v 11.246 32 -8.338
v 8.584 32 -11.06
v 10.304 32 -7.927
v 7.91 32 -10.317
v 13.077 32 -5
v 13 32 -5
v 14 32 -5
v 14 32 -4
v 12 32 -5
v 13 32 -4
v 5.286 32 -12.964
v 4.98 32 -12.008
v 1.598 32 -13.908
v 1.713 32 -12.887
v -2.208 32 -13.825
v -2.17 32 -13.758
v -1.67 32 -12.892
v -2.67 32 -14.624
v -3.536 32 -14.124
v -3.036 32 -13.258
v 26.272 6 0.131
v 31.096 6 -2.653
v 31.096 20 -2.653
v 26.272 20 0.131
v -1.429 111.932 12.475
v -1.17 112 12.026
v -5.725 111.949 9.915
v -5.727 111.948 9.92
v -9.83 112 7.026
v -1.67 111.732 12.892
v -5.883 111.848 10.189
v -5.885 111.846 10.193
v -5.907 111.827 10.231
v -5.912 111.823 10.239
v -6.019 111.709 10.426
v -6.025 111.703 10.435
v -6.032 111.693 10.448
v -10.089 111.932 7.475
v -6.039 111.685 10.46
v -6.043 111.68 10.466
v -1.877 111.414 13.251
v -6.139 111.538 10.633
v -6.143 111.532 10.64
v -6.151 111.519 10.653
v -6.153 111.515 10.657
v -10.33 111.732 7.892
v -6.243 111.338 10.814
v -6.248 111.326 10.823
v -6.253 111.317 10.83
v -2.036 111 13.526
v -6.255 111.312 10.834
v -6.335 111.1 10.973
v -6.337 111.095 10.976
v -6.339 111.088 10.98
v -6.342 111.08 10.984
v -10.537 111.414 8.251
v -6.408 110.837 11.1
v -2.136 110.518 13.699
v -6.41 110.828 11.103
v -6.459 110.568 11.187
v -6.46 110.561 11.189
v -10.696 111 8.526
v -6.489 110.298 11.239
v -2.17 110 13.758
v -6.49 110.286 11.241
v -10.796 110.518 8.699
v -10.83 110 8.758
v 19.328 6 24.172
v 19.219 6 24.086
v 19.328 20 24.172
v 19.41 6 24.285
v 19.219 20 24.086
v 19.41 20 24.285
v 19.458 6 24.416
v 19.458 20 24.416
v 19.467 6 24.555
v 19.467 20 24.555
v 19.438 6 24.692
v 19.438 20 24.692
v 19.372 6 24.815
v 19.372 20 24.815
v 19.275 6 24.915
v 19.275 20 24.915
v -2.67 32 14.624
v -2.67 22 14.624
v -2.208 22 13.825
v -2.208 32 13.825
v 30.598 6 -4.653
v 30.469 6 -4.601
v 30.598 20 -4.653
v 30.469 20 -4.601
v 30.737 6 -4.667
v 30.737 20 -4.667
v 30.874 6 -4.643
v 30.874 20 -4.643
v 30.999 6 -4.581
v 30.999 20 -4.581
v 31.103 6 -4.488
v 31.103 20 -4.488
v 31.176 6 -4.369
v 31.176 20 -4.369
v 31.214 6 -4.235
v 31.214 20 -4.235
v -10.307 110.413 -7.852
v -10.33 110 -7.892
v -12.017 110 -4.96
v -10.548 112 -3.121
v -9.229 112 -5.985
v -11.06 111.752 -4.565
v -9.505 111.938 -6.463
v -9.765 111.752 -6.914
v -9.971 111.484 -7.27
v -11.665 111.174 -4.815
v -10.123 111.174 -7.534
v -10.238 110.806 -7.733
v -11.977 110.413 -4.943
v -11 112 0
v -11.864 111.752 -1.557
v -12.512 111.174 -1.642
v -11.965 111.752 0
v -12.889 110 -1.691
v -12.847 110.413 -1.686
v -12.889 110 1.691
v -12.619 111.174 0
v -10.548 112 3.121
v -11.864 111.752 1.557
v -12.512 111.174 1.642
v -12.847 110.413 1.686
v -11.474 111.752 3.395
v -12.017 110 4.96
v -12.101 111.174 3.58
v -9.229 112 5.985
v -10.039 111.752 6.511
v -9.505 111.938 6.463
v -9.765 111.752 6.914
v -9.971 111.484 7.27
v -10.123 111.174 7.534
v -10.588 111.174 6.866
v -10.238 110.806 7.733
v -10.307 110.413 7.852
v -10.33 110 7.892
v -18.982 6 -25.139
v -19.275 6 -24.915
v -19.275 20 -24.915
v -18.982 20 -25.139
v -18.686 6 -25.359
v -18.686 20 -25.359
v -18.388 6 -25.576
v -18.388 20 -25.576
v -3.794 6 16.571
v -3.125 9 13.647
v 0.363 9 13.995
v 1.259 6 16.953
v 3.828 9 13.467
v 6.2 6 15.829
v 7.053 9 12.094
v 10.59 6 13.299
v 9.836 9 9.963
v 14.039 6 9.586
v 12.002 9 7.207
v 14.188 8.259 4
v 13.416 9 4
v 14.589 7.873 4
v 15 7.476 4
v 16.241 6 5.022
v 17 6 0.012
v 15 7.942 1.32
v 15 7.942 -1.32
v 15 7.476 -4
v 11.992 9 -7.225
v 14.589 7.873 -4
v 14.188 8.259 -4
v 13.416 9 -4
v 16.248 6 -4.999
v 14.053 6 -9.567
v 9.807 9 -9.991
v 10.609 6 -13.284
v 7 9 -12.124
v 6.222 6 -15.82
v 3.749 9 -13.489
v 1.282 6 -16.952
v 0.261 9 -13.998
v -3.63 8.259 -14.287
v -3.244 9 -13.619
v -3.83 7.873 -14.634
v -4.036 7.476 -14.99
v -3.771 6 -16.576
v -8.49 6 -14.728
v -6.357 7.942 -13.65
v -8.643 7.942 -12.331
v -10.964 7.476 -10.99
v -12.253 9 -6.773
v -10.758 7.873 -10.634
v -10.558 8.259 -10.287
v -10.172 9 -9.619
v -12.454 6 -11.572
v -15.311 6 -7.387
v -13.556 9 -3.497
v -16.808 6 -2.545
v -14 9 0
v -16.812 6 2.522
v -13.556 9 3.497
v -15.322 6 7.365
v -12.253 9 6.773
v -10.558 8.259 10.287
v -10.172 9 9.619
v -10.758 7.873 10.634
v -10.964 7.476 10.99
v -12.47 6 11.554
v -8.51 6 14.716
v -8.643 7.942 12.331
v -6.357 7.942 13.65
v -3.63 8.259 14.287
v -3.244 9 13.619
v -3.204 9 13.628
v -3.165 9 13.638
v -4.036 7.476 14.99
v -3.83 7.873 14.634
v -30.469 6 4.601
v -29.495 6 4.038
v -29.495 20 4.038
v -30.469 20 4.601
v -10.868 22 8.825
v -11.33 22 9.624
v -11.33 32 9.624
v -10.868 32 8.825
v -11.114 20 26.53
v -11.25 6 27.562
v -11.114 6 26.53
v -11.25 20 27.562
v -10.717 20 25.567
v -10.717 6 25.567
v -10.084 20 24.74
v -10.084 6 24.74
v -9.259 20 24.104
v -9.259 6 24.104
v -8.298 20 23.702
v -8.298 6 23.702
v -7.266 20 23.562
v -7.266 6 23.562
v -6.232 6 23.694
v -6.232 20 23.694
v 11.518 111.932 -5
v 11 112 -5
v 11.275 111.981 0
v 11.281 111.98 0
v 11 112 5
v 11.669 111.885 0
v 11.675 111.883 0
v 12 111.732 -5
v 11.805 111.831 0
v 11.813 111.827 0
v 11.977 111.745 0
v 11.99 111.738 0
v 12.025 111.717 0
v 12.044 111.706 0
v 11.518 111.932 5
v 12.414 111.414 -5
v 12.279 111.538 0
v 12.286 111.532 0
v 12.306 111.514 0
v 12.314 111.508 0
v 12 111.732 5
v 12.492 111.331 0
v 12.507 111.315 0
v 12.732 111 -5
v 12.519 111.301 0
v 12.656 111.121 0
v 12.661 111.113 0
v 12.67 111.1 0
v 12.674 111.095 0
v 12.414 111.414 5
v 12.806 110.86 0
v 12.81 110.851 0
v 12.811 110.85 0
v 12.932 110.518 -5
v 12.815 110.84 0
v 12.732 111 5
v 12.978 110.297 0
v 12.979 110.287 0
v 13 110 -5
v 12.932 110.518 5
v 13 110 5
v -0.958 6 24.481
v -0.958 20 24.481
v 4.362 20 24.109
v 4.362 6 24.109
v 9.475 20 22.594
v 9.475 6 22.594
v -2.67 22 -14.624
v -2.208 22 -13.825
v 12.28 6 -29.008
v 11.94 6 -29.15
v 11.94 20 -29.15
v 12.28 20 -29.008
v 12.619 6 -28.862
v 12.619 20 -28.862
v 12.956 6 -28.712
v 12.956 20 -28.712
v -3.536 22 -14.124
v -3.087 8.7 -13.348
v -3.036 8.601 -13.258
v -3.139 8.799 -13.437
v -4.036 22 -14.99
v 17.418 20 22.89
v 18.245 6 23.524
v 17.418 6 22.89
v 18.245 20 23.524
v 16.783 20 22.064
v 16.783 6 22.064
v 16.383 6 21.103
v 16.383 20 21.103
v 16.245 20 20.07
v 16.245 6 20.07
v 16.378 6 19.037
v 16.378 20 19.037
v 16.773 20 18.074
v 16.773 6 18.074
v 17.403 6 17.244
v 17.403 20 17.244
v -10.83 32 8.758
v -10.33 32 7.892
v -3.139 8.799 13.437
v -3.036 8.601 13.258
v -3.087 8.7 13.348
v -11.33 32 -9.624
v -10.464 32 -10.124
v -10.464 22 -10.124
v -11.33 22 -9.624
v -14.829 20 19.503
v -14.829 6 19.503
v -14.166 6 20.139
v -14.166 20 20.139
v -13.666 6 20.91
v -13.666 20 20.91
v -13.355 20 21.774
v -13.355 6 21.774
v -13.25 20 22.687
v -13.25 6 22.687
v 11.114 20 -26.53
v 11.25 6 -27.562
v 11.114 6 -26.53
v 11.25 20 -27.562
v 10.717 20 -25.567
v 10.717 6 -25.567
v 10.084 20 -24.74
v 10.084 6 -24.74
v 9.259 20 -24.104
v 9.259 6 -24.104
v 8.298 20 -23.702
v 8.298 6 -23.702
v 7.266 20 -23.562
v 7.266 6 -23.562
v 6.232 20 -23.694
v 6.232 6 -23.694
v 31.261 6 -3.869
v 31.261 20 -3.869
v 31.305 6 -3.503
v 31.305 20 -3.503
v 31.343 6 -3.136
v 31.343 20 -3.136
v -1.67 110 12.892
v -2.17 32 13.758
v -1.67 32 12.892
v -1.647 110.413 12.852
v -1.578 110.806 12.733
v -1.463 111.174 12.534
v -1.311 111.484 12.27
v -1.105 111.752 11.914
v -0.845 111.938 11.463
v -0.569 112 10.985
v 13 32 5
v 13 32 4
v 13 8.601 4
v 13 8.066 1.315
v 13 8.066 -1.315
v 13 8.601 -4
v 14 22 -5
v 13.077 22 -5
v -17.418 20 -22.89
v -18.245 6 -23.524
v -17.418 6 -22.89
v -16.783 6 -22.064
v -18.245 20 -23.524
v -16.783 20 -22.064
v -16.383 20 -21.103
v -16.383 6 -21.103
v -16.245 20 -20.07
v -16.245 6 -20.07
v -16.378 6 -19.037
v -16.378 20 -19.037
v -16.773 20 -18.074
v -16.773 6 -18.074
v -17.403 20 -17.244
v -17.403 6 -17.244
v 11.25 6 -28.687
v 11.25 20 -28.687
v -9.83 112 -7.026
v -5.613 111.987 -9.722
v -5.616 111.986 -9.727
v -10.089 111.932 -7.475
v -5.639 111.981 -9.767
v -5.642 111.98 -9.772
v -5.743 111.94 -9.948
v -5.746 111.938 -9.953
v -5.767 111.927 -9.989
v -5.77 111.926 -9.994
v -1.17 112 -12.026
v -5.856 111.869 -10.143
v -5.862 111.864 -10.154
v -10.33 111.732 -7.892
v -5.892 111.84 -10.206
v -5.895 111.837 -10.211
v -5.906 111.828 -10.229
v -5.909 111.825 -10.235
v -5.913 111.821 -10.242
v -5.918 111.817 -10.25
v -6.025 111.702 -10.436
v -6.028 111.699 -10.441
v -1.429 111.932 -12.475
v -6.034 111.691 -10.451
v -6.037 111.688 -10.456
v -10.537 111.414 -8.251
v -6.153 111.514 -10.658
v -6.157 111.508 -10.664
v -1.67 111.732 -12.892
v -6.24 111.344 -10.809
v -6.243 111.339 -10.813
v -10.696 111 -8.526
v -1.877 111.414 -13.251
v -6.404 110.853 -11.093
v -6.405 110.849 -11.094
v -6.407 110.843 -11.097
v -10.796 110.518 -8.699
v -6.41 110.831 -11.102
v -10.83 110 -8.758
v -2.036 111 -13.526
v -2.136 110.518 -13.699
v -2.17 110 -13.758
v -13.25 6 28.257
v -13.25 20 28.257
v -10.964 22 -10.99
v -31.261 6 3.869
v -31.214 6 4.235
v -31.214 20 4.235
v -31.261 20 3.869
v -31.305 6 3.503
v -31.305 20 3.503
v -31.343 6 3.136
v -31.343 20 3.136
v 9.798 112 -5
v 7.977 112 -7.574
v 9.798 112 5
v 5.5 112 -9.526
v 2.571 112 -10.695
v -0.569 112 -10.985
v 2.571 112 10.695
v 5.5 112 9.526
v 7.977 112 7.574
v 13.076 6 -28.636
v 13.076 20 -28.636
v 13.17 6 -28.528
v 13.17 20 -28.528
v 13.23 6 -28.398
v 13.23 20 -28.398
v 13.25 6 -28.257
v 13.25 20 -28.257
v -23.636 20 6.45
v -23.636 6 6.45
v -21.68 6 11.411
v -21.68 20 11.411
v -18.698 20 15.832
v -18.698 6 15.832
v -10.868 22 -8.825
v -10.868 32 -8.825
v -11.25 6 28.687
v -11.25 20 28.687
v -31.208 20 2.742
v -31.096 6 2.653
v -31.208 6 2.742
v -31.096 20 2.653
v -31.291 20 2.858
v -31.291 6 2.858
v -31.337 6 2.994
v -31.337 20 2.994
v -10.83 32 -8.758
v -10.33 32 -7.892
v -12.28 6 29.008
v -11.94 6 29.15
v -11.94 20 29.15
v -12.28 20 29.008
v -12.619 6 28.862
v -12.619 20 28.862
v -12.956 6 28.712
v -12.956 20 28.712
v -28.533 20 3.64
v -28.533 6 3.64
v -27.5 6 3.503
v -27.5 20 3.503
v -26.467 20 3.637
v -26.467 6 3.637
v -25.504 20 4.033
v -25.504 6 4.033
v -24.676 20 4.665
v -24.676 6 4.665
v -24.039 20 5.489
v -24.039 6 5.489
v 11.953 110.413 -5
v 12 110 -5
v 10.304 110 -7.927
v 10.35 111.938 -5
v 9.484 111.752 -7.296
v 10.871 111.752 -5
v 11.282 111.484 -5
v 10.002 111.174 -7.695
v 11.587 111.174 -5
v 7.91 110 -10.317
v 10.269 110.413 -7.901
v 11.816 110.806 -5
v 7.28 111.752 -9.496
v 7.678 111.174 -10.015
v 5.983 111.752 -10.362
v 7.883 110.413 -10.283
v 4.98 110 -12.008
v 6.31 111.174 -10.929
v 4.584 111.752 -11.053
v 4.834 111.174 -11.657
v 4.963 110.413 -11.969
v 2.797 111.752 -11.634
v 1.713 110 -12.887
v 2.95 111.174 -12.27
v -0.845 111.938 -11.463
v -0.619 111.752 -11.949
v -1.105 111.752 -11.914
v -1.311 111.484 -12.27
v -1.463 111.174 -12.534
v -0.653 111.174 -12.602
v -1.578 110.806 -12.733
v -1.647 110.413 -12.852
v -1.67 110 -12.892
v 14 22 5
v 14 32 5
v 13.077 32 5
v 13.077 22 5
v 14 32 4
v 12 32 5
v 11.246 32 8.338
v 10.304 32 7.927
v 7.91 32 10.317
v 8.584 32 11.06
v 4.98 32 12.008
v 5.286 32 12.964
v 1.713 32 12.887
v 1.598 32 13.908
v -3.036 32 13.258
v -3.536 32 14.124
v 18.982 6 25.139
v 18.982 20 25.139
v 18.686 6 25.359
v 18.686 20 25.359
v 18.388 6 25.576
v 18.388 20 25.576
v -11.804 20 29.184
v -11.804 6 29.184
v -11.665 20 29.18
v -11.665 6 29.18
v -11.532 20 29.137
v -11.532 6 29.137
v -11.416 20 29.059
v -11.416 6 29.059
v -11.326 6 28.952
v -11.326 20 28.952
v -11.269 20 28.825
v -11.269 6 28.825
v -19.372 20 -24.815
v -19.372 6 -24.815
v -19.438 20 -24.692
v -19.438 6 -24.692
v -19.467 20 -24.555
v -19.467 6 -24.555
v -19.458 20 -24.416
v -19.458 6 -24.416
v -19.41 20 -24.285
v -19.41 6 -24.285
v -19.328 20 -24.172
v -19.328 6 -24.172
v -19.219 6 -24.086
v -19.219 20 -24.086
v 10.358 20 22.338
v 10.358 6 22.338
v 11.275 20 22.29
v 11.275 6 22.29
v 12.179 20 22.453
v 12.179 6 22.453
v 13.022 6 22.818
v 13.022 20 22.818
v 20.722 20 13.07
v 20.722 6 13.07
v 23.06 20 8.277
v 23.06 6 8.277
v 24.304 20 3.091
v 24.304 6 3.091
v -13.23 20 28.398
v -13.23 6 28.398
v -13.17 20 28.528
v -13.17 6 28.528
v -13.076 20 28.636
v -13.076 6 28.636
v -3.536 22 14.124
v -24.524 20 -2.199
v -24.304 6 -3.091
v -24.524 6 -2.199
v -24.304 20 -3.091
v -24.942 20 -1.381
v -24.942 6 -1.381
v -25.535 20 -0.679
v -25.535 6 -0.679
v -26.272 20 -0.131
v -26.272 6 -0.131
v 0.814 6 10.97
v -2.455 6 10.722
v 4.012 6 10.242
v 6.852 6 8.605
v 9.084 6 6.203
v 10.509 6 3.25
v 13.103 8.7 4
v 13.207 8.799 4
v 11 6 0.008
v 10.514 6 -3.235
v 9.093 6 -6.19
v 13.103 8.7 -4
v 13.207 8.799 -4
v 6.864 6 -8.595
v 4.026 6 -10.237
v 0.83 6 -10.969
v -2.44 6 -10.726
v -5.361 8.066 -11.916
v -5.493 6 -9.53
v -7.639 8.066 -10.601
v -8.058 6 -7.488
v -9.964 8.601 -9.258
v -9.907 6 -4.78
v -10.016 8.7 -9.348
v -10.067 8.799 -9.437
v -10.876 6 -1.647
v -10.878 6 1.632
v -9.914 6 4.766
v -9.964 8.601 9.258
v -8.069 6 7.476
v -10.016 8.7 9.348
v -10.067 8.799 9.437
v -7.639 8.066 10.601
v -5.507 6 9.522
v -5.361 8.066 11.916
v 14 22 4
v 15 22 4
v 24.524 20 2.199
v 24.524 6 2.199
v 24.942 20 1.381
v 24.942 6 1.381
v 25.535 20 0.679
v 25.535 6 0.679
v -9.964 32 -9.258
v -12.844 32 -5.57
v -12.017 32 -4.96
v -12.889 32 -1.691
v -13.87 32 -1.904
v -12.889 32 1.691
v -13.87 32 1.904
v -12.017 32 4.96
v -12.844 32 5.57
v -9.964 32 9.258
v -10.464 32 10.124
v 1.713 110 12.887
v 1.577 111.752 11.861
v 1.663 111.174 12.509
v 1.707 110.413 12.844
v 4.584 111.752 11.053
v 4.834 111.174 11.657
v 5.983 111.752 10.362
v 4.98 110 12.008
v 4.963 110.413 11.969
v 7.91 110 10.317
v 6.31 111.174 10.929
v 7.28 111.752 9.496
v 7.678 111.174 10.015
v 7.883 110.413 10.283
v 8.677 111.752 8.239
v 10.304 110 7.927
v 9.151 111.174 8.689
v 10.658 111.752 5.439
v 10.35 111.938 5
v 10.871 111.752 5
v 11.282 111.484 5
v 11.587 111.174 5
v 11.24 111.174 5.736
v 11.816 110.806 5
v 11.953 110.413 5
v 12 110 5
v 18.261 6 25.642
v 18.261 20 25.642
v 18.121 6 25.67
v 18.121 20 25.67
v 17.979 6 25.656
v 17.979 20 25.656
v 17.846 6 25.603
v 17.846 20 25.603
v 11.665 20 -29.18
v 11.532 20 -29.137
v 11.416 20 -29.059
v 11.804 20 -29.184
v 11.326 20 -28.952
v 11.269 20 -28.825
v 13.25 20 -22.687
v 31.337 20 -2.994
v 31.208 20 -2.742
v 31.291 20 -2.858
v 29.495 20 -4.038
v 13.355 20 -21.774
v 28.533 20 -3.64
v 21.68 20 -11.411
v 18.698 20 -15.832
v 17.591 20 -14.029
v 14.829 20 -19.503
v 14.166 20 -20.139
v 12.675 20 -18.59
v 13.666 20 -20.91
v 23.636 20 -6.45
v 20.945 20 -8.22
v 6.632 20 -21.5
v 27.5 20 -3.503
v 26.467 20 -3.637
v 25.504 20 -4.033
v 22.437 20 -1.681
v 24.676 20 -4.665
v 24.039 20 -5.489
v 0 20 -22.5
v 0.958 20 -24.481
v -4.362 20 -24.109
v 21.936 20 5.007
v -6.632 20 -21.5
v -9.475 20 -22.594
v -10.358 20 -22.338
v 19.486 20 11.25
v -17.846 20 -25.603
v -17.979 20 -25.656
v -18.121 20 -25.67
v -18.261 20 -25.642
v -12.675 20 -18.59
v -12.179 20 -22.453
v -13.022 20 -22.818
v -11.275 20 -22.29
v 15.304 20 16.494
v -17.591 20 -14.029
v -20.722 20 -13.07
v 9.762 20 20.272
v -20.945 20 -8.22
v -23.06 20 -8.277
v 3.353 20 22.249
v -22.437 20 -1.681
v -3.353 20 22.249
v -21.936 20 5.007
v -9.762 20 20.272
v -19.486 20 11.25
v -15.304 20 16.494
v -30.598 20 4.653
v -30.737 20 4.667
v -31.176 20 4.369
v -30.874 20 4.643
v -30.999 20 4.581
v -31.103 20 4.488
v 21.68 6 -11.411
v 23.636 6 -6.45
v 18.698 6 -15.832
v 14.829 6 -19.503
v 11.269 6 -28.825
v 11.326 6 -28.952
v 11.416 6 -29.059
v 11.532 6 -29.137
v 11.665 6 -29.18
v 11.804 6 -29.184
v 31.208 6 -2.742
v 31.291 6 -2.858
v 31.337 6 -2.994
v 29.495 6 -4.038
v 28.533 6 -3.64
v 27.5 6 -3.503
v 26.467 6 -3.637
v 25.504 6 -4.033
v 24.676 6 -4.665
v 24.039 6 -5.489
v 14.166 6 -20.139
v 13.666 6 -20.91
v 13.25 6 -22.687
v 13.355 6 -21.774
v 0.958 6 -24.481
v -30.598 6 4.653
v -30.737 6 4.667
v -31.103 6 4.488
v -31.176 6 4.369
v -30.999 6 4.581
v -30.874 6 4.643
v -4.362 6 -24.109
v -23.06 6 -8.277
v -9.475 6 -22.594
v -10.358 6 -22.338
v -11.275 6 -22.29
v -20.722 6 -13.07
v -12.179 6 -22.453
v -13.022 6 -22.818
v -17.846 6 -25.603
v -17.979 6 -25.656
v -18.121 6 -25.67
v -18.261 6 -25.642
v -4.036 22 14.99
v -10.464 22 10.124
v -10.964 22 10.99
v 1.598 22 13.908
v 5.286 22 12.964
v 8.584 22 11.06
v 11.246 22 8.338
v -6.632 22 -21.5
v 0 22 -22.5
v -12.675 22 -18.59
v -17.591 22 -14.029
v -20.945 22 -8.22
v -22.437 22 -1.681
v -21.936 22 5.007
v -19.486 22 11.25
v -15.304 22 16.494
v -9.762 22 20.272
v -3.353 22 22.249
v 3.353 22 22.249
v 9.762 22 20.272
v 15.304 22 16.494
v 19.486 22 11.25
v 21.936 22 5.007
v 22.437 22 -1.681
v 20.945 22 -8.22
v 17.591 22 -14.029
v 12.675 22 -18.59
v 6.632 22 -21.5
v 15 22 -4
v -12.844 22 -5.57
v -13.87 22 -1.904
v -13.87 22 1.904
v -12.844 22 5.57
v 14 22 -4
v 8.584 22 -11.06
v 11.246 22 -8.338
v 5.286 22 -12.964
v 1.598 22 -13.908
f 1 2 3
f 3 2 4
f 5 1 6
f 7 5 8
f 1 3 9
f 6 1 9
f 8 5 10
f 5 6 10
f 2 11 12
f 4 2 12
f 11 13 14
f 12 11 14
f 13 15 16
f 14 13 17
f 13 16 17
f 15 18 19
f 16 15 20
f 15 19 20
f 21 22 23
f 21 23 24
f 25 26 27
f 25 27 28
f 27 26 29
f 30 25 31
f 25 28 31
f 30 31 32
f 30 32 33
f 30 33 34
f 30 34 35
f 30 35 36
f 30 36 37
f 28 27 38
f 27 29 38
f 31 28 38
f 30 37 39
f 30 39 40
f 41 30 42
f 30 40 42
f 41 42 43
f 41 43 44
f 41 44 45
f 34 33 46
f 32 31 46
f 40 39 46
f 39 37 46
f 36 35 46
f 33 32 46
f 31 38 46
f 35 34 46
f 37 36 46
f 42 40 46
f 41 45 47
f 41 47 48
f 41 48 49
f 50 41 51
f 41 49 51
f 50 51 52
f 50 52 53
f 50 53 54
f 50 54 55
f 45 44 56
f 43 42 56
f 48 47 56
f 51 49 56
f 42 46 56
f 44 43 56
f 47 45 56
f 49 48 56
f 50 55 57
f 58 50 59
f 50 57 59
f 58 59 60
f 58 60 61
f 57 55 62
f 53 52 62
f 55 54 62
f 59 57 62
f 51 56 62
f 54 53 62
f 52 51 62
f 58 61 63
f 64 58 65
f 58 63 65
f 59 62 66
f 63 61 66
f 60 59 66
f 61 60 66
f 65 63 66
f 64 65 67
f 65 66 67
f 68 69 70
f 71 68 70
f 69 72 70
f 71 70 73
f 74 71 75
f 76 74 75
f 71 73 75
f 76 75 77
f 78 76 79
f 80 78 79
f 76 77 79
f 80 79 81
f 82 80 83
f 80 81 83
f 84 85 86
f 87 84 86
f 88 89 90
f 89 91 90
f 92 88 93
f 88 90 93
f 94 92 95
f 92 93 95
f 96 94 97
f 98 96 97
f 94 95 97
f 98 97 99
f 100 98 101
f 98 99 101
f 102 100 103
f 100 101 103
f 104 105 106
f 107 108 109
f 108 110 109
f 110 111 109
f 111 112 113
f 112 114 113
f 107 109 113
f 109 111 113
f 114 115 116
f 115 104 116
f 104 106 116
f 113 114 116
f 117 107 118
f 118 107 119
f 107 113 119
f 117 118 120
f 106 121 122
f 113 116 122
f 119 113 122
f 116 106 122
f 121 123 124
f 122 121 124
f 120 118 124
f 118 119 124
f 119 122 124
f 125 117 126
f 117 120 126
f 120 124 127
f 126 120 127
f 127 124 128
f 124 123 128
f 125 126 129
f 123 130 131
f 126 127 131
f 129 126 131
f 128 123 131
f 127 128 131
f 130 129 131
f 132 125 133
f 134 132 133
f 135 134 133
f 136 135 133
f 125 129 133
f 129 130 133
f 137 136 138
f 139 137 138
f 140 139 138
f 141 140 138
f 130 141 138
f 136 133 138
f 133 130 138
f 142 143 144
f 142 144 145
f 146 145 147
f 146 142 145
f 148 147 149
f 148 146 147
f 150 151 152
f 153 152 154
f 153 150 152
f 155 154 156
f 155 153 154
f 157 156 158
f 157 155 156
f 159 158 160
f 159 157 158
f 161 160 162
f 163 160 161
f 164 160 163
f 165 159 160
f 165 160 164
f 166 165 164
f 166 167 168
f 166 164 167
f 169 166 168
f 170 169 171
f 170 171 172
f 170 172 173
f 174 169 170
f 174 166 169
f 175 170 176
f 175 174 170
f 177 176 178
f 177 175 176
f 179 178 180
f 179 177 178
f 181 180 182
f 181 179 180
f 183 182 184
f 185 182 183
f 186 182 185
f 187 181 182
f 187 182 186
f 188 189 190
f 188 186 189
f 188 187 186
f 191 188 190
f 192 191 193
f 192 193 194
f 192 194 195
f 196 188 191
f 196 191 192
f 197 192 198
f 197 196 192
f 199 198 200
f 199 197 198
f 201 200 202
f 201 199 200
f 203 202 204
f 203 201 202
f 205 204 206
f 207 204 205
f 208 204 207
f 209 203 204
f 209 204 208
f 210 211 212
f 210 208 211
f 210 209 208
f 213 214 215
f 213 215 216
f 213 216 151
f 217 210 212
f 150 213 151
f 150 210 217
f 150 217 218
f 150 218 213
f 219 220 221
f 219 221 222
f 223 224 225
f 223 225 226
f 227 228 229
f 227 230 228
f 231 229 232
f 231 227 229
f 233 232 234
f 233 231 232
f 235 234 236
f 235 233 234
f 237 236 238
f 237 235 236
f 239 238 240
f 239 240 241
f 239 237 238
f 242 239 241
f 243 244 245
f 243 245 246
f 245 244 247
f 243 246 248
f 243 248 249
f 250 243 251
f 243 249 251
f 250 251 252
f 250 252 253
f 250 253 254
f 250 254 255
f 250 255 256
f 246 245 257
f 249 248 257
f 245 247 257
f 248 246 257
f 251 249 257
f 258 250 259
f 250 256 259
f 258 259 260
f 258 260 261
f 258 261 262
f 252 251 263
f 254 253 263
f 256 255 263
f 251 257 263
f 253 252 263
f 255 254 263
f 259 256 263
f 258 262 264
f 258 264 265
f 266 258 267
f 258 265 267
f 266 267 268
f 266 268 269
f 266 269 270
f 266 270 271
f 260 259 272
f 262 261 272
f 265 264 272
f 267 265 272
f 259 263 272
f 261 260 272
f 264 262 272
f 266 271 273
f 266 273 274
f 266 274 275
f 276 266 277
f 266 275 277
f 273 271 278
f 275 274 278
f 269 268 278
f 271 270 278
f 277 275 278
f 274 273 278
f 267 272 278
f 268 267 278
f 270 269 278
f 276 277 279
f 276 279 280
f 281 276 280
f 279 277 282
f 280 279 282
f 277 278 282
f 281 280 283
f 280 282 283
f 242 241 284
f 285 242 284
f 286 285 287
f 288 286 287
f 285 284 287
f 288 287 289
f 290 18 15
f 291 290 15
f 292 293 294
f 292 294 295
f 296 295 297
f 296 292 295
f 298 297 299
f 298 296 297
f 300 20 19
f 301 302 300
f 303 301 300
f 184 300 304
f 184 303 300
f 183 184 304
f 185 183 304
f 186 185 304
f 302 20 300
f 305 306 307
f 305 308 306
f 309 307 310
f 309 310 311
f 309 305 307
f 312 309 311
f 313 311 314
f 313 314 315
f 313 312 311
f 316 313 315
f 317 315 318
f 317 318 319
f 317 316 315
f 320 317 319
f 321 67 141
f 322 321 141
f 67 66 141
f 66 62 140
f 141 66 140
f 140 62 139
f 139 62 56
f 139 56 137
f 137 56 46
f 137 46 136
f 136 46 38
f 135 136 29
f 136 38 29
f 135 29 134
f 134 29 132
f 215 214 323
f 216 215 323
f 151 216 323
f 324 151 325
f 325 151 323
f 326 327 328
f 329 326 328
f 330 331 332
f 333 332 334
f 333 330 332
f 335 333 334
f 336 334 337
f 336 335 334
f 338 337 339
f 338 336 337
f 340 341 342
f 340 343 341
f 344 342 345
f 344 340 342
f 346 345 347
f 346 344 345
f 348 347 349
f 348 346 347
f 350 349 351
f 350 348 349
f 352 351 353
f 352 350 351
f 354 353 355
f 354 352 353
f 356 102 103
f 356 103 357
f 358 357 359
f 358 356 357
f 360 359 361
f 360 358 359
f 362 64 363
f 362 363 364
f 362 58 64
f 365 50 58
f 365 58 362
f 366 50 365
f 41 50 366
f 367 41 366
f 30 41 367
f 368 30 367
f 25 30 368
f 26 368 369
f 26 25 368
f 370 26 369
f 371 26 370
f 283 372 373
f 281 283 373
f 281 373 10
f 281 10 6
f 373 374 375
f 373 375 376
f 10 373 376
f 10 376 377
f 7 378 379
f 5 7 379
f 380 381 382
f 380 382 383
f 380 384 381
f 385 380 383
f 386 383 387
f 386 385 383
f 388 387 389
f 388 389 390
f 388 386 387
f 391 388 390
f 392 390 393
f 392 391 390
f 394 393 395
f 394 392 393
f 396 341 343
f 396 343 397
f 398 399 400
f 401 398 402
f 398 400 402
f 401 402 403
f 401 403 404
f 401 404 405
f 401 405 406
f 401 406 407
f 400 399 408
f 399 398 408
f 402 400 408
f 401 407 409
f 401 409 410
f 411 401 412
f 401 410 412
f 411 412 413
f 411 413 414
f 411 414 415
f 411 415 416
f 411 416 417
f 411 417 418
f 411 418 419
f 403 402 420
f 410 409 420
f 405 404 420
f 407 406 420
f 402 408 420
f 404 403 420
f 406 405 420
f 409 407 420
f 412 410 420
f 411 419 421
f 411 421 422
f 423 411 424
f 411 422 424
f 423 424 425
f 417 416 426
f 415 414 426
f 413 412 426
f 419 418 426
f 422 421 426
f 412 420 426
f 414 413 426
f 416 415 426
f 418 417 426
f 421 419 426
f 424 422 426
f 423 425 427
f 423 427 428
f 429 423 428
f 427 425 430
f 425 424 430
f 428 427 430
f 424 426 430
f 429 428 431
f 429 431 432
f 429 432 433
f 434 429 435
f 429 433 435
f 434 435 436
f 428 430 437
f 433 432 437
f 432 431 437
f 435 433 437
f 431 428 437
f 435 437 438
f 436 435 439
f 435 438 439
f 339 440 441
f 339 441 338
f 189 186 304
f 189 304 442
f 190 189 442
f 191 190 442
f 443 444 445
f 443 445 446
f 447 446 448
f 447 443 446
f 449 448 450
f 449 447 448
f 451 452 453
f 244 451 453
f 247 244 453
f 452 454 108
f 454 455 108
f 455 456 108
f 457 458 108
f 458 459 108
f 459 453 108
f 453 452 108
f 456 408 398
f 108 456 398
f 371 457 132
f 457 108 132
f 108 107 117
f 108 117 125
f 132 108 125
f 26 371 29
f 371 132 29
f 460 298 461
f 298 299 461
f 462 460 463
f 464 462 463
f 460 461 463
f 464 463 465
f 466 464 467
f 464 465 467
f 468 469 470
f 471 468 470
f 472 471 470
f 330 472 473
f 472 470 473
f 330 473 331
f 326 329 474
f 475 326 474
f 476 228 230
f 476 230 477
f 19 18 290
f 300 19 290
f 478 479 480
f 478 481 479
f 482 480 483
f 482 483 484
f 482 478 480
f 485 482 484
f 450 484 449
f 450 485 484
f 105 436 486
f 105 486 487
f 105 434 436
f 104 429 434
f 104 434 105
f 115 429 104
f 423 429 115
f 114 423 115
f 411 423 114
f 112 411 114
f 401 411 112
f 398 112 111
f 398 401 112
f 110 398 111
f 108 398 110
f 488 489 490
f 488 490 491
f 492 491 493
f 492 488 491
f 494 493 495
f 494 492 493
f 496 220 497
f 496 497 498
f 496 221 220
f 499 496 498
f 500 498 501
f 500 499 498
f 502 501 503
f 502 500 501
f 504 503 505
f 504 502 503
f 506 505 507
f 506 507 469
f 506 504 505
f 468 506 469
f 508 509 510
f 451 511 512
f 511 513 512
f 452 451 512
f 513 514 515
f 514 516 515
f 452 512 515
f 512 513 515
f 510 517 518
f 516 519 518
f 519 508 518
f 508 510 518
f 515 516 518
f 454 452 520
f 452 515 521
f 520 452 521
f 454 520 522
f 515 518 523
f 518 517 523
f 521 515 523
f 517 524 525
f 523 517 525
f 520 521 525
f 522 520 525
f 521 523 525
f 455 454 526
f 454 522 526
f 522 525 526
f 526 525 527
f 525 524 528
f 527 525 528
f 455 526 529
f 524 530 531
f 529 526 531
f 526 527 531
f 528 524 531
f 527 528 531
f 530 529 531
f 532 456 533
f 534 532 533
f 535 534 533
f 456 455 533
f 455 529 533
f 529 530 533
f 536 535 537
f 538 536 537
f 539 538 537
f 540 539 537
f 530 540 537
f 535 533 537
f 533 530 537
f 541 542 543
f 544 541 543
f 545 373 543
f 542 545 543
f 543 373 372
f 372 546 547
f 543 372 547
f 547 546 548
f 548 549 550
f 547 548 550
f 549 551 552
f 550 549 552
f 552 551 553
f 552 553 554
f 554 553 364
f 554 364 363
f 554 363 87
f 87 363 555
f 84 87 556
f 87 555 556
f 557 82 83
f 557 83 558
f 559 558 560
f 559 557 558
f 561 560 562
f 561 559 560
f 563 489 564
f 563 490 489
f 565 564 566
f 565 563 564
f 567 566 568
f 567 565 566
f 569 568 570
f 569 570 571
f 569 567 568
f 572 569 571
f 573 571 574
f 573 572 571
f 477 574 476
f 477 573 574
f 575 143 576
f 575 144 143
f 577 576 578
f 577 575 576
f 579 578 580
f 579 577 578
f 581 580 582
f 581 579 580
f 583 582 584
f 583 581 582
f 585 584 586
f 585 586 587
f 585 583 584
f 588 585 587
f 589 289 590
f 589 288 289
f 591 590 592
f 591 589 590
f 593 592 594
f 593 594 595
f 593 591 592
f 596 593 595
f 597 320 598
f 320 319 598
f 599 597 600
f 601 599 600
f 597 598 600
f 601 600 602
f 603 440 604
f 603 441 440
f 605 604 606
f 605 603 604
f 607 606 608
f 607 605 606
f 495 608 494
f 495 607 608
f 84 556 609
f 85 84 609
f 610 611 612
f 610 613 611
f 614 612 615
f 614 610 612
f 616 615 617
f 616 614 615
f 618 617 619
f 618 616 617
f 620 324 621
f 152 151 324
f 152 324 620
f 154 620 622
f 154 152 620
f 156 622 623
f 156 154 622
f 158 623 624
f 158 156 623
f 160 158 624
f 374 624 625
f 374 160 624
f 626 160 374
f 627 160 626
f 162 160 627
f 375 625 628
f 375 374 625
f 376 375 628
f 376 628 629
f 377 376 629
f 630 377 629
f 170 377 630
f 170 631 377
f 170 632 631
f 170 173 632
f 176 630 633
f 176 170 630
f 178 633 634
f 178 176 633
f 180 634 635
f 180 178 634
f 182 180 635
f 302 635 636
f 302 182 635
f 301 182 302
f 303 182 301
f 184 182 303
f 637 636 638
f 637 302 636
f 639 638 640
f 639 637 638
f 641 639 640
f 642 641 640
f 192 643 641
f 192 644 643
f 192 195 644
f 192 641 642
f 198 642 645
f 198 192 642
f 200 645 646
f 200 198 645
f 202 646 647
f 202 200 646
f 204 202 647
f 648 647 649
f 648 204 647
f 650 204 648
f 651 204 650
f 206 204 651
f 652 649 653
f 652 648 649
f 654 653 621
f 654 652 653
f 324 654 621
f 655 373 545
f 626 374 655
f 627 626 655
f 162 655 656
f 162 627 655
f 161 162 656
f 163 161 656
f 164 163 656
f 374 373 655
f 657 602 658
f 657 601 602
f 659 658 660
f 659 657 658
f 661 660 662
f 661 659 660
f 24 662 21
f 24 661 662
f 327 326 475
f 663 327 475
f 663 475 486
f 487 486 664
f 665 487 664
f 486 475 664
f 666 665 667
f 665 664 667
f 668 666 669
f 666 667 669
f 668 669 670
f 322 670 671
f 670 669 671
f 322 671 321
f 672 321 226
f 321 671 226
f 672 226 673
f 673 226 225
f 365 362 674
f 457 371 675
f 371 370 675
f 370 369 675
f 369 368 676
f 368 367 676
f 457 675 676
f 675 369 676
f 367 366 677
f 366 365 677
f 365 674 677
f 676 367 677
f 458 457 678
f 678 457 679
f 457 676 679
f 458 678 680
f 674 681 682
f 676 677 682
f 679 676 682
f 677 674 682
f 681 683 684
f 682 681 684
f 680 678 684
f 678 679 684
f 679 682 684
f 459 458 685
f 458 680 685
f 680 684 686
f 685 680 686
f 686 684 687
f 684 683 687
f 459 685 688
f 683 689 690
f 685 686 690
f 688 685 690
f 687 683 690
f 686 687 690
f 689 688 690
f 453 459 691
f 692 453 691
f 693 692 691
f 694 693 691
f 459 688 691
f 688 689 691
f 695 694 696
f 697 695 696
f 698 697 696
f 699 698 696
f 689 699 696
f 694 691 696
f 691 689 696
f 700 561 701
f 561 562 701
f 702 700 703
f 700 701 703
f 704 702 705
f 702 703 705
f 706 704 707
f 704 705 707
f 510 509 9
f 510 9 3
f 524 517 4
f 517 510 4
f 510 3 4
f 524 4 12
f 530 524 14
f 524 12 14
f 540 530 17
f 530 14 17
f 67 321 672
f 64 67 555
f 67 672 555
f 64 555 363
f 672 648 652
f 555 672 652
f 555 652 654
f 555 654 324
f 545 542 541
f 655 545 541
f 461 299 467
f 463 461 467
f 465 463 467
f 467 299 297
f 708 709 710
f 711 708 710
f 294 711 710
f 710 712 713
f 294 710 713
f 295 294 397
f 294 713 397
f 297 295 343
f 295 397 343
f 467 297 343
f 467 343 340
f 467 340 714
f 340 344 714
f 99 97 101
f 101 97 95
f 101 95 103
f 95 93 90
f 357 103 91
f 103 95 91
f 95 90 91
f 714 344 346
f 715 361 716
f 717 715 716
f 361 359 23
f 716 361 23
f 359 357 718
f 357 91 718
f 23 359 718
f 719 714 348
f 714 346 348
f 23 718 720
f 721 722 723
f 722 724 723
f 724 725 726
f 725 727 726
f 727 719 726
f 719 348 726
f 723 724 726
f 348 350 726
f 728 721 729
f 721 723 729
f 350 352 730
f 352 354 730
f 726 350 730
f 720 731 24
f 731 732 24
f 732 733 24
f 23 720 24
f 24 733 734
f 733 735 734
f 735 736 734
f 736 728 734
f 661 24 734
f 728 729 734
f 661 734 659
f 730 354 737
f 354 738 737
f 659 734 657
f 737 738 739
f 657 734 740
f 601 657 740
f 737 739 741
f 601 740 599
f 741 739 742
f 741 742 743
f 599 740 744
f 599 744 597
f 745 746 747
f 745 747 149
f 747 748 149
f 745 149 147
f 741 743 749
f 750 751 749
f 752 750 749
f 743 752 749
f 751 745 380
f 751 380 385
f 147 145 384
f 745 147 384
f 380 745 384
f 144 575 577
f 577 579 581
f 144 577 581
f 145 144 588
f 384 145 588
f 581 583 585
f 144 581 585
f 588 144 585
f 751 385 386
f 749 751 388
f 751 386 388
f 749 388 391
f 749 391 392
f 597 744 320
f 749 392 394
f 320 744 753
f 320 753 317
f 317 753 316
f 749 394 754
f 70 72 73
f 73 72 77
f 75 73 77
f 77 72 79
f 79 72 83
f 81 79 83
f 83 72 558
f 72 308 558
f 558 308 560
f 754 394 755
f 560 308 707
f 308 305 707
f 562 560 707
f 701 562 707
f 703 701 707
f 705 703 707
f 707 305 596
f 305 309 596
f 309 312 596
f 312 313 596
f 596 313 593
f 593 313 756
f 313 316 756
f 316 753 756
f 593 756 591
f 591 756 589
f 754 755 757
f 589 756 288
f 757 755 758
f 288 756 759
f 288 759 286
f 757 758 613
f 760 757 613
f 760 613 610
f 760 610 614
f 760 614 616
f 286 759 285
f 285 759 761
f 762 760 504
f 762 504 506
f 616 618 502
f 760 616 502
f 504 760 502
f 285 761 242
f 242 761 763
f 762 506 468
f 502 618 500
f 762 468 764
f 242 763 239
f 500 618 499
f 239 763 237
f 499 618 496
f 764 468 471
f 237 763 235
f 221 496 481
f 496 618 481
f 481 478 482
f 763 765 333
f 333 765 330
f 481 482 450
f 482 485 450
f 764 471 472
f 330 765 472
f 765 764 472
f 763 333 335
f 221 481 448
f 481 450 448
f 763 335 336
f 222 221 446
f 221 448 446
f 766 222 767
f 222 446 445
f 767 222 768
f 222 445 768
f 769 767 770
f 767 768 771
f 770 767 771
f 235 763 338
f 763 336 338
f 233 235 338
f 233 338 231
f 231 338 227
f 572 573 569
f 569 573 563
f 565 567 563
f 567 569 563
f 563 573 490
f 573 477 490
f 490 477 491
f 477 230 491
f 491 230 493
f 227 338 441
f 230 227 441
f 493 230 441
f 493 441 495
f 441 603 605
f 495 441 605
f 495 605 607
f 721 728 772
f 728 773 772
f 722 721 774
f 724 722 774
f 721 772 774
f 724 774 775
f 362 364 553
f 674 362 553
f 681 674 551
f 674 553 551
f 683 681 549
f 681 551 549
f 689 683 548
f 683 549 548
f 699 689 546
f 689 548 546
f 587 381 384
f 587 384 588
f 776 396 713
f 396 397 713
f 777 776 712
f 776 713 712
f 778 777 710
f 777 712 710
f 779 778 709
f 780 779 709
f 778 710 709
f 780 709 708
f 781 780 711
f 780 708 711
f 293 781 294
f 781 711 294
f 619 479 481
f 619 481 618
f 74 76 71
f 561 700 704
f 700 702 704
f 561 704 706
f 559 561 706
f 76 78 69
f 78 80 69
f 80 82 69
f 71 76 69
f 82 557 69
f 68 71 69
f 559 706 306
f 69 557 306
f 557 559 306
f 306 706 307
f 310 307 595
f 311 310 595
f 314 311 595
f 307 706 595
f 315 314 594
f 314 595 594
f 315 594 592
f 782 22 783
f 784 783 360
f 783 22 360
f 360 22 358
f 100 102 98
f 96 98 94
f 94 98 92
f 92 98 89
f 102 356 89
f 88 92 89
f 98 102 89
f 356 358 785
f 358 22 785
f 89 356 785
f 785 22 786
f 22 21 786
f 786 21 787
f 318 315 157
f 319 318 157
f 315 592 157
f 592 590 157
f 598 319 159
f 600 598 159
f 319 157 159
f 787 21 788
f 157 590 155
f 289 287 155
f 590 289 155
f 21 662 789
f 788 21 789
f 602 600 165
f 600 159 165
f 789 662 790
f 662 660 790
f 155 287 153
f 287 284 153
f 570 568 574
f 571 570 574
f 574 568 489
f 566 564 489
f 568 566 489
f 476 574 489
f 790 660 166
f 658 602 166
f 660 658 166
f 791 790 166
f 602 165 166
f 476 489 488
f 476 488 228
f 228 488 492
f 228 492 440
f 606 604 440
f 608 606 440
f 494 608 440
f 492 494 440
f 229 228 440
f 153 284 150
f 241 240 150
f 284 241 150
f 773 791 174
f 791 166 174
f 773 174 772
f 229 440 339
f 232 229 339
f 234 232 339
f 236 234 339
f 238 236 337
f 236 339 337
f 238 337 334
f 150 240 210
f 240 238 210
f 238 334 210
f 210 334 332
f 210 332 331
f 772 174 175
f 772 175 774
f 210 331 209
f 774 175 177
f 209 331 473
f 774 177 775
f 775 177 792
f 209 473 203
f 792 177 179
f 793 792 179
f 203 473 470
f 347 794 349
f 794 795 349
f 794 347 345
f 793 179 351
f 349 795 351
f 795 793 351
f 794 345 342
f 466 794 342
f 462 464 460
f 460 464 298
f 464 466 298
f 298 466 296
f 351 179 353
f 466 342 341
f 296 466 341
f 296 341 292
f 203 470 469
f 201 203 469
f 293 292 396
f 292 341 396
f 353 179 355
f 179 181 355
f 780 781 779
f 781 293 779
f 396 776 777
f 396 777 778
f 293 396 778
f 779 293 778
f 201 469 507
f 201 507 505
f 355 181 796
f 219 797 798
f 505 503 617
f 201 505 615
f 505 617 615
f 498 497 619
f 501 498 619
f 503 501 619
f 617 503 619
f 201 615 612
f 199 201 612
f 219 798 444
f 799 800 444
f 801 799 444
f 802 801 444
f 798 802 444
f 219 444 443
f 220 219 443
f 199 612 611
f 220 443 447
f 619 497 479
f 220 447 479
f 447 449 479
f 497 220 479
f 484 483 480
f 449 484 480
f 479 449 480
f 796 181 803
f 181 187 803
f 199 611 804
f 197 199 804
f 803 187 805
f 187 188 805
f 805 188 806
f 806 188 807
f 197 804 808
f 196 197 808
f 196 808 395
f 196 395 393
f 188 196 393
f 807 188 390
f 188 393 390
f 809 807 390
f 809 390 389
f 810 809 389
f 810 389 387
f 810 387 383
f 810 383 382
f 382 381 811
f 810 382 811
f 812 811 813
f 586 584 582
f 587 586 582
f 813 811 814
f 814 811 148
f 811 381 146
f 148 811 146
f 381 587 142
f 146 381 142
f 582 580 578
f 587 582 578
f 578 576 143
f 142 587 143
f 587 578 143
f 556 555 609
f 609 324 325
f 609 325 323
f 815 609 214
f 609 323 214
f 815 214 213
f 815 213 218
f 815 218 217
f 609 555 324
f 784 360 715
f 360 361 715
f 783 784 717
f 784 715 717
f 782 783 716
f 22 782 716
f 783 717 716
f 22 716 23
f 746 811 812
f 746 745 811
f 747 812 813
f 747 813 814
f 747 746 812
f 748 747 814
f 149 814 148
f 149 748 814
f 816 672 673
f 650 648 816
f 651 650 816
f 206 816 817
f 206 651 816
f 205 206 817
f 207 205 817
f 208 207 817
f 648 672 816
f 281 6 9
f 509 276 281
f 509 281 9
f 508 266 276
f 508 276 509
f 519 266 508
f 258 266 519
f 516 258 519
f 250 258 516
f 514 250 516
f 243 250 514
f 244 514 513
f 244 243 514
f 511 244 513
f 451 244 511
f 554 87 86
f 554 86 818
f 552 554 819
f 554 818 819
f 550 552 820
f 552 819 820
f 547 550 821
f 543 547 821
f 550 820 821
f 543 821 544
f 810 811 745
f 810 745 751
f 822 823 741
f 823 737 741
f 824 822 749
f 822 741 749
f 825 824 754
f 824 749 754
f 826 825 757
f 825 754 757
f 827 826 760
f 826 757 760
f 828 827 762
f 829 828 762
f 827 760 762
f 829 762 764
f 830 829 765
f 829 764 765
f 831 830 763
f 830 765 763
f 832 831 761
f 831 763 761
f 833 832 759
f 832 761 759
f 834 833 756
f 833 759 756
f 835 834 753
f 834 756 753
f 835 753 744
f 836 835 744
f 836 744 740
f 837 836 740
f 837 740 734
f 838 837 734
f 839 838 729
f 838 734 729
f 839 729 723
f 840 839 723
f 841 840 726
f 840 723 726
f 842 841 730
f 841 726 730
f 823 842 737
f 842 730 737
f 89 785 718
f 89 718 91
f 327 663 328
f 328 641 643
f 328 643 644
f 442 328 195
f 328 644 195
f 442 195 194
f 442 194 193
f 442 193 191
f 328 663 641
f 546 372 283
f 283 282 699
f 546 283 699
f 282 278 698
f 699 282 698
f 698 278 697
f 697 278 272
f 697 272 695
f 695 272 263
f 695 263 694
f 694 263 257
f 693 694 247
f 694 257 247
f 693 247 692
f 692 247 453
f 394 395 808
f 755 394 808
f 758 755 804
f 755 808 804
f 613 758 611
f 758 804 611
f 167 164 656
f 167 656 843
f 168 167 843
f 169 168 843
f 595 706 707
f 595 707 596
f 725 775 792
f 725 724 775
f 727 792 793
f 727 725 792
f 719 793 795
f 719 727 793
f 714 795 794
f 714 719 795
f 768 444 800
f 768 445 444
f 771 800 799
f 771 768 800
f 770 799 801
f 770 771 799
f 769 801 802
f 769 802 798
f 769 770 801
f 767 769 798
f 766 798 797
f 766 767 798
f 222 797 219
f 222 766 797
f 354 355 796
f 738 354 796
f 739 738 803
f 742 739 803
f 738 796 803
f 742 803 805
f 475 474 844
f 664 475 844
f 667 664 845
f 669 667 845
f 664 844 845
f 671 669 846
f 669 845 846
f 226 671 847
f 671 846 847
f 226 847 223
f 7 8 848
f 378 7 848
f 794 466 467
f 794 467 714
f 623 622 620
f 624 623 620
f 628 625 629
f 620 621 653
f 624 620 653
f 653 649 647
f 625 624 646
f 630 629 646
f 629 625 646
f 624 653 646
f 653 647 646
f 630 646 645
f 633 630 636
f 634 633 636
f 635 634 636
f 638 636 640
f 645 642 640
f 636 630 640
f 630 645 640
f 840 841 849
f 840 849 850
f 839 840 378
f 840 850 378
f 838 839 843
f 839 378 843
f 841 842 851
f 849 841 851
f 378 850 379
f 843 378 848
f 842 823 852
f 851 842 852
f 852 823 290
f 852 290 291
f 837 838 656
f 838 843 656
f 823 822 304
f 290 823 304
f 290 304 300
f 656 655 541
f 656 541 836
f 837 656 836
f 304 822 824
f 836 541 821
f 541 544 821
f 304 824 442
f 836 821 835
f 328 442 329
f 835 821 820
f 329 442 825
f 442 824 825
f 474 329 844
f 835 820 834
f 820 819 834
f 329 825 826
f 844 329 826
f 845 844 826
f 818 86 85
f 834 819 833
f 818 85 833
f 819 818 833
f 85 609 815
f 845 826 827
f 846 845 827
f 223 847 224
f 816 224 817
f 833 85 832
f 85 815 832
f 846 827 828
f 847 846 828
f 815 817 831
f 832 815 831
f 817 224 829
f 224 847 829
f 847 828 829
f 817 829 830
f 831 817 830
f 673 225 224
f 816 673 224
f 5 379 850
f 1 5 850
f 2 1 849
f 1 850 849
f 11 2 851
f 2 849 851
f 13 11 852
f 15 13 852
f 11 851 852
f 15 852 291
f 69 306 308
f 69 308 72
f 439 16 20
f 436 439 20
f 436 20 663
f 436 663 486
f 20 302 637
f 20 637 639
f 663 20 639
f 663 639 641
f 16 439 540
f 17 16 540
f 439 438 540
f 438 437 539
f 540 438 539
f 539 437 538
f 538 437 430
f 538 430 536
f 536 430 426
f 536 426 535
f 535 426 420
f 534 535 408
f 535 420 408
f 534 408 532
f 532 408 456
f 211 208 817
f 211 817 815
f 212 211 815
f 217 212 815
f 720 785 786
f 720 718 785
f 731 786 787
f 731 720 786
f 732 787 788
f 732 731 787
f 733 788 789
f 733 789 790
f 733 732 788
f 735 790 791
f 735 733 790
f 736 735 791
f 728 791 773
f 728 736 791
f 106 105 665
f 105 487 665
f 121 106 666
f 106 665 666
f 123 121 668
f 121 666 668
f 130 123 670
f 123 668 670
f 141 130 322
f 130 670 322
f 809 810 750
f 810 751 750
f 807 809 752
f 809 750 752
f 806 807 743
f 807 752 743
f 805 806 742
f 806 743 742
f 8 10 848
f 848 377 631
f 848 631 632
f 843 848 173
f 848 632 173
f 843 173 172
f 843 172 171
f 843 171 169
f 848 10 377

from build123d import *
from build123d.topology import SkipClean

# Parameters (mm, degrees)
BOSS_EXTRUDE1_DEPTH = 5
CIRPATTERN1_COUNT   = 3
BOSS_EXTRUDE2_START = 6
BOSS_EXTRUDE2_DEPTH = 14
FILLET1_R           = 4
FILLET2_R           = 0.5
SKETCH15_W          = 2
SKETCH15_H          = 8
CUT_EXTRUDE1_DEPTH  = 120.910149393
CIRPATTERN2_COUNT   = 3


with BuildPart() as part:
    # Sketch8 → Revolve1 (revolve)
    with BuildSketch(Plane.XY, mode=Mode.PRIVATE) as revolve1_sk:
        with BuildLine():
            Line((13, 32), (14, 32))
            Line((14, 32), (14, 22))
            Line((14, 22), (22.5, 22))
            Line((22.5, 22), (22.5, 20))
            Line((22.5, 20), (24.5, 20))
            Line((24.5, 20), (24.5, 6))
            Line((24.5, 6), (0, 6))
            Line((0, 6), (0, 112))
            Line((0, 112), (11, 112))
            ThreePointArc((11, 112), (12.414213562, 111.414213562), (13, 110))
            Line((13, 110), (13, 32))
        make_face()
    revolve(revolve1_sk.sketch.rotate(Axis((0, 22, 0), (0, 1, 0)), 90), axis=Axis((0, 22, 0), (0, 1, 0)))

    # Sketch9 → Boss-Extrude1 (add, symmetric)
    with BuildSketch(Plane.XY):
        with BuildLine():
            Line((13, 32), (14, 32))
            Line((14, 32), (14, 22))
            Line((14, 22), (0, 22))
            Line((0, 22), (0, 112))
            Line((0, 112), (11, 112))
            ThreePointArc((11, 112), (12.414213562, 111.414213562), (13, 110))
            Line((13, 110), (13, 32))
        make_face()
    boss_extrude1 = extrude(amount=BOSS_EXTRUDE1_DEPTH, both=True)

    # CirPattern1: Boss-Extrude1 ×3 about axis
    cirpattern1_axis = Axis((0, 0, 0), (0, 1, 0))
    for i in range(1, CIRPATTERN1_COUNT):
        add(boss_extrude1.rotate(cirpattern1_axis, i * 360 / CIRPATTERN1_COUNT))

    # Sketch13 → Boss-Extrude2 (add)
    with BuildSketch(Plane(origin=(0, 0, 0), x_dir=(1, 0, 0), z_dir=(0, 1, 0)).offset(BOSS_EXTRUDE2_START)):
        with BuildLine():
            Line((-24.473491319, -1.139395744), (-31.105691219, -4.968498142))
            ThreePointArc((-31.105691219, -4.968498142), (-31.258439449, -3.893579744), (-31.374053012, -2.814035819))
            Line((-31.374053012, -2.814035819), (-24.472006051, 1.170862852))
            ThreePointArc((-24.472006051, 1.170862852), (-24.499994937, 0.015751071), (-24.473491319, -1.139395744))
        make_face()
        with BuildLine():
            Line((13.223491319, -20.624967329), (19.855691219, -24.454069727))
            ThreePointArc((19.855691219, -24.454069727), (19.001158695, -25.123812773), (18.124053012, -25.763709019))
            Line((18.124053012, -25.763709019), (11.222006051, -21.778810348))
            ThreePointArc((11.222006051, -21.778810348), (12.236356641, -21.225493543), (13.223491319, -20.624967329))
        make_face()
        with BuildLine():
            Line((24.473491319, 1.139395744), (31.105691219, 4.968498142))
            ThreePointArc((31.105691219, 4.968498142), (31.258439449, 3.893579744), (31.374053012, 2.814035819))
            Line((31.374053012, 2.814035819), (24.472006051, -1.170862852))
            ThreePointArc((24.472006051, -1.170862852), (24.499994937, -0.015751071), (24.473491319, 1.139395744))
        make_face()
        with BuildLine():
            Line((11.25, 21.764363074), (11.25, 29.422567869))
            ThreePointArc((11.25, 29.422567869), (12.257280754, 29.017392517), (13.25, 28.577744838))
            Line((13.25, 28.577744838), (13.25, 20.607947496))
            ThreePointArc((13.25, 20.607947496), (12.263638296, 21.209742473), (11.25, 21.764363074))
        make_face()
        with BuildLine():
            Line((-13.223491319, 20.624967329), (-19.855691219, 24.454069727))
            ThreePointArc((-19.855691219, 24.454069727), (-19.001158695, 25.123812773), (-18.124053012, 25.763709019))
            Line((-18.124053012, 25.763709019), (-11.222006051, 21.778810348))
            ThreePointArc((-11.222006051, 21.778810348), (-12.236356641, 21.225493543), (-13.223491319, 20.624967329))
        make_face()
        with BuildLine():
            Line((-11.25, -21.764363074), (-11.25, -29.422567869))
            ThreePointArc((-11.25, -29.422567869), (-12.257280754, -29.017392517), (-13.25, -28.577744838))
            Line((-13.25, -28.577744838), (-13.25, -20.607947496))
            ThreePointArc((-13.25, -20.607947496), (-12.263638296, -21.209742473), (-11.25, -21.764363074))
        make_face()
    extrude(amount=BOSS_EXTRUDE2_DEPTH)

    # Fillet1
    fillet1_edges = [part.edges().sort_by_distance(p)[0] for p in [
        (-24.473491319, 13, 1.139395744),
        (-24.472006051, 13, -1.170862852),
        (-11.25, 13, 21.764363074),
        (-13.25, 13, 20.607947496),
        (-13.223491319, 13, -20.624967329),
        (-11.222006051, 13, -21.778810348),
        (11.25, 13, -21.764363074),
        (13.25, 13, -20.607947496),
        (24.473491319, 13, -1.139395744),
        (24.472006051, 13, 1.170862852),
        (13.223491319, 13, 20.624967329),
        (11.222006051, 13, 21.778810348),
    ]]
    fillet(fillet1_edges, radius=FILLET1_R)

    # Fillet2
    fillet2_edges = [part.edges().sort_by_distance(p)[0] for p in [
        (-31.374053012, 13, 2.814035819),
        (-31.105691219, 13, 4.968498142),
        (-13.25, 13, 28.577744838),
        (-11.25, 13, 29.422567869),
        (-18.124053012, 13, -25.763709019),
        (-19.855691219, 13, -24.454069727),
        (13.25, 13, -28.577744838),
        (11.25, 13, -29.422567869),
        (31.374053012, 13, -2.814035819),
        (31.105691219, 13, -4.968498142),
        (18.124053012, 13, 25.763709019),
        (19.855691219, 13, 24.454069727),
    ]]
    fillet(fillet2_edges, radius=FILLET2_R)

    # Sketch15 → Cut-Extrude1 (cut, through all)
    with BuildSketch(Plane(origin=(0, 0, 0), x_dir=(1, 0, 0), z_dir=(0, 1, 0))):
        with Locations((14, 0)):
            Rectangle(SKETCH15_W, SKETCH15_H)
    cut_extrude1 = extrude(amount=CUT_EXTRUDE1_DEPTH, mode=Mode.SUBTRACT)

    # CirPattern2: Cut-Extrude1 ×3 about axis
    cirpattern2_axis = Axis((0, 0, 0), (0, 1, 0))
    for i in range(1, CIRPATTERN2_COUNT):
        add(cut_extrude1.rotate(cirpattern2_axis, i * 360 / CIRPATTERN2_COUNT), mode=Mode.SUBTRACT)

    # Sketch16 → Cut-Revolve1 (revolve, cut)
    with SkipClean():  # the faces are left unmerged after this step: merging them gives an invalid solid
        with BuildSketch(Plane.XY, mode=Mode.PRIVATE) as cut_revolve1_sk:
            Polygon((11, 6), (14, 9), (17, 6), align=None)
        revolve(cut_revolve1_sk.sketch.rotate(Axis((0, 0, 0), (0, 1, 0)), 257.102728972), axis=Axis((0, 0, 0), (0, 1, 0)), mode=Mode.SUBTRACT)


solid = part.part
